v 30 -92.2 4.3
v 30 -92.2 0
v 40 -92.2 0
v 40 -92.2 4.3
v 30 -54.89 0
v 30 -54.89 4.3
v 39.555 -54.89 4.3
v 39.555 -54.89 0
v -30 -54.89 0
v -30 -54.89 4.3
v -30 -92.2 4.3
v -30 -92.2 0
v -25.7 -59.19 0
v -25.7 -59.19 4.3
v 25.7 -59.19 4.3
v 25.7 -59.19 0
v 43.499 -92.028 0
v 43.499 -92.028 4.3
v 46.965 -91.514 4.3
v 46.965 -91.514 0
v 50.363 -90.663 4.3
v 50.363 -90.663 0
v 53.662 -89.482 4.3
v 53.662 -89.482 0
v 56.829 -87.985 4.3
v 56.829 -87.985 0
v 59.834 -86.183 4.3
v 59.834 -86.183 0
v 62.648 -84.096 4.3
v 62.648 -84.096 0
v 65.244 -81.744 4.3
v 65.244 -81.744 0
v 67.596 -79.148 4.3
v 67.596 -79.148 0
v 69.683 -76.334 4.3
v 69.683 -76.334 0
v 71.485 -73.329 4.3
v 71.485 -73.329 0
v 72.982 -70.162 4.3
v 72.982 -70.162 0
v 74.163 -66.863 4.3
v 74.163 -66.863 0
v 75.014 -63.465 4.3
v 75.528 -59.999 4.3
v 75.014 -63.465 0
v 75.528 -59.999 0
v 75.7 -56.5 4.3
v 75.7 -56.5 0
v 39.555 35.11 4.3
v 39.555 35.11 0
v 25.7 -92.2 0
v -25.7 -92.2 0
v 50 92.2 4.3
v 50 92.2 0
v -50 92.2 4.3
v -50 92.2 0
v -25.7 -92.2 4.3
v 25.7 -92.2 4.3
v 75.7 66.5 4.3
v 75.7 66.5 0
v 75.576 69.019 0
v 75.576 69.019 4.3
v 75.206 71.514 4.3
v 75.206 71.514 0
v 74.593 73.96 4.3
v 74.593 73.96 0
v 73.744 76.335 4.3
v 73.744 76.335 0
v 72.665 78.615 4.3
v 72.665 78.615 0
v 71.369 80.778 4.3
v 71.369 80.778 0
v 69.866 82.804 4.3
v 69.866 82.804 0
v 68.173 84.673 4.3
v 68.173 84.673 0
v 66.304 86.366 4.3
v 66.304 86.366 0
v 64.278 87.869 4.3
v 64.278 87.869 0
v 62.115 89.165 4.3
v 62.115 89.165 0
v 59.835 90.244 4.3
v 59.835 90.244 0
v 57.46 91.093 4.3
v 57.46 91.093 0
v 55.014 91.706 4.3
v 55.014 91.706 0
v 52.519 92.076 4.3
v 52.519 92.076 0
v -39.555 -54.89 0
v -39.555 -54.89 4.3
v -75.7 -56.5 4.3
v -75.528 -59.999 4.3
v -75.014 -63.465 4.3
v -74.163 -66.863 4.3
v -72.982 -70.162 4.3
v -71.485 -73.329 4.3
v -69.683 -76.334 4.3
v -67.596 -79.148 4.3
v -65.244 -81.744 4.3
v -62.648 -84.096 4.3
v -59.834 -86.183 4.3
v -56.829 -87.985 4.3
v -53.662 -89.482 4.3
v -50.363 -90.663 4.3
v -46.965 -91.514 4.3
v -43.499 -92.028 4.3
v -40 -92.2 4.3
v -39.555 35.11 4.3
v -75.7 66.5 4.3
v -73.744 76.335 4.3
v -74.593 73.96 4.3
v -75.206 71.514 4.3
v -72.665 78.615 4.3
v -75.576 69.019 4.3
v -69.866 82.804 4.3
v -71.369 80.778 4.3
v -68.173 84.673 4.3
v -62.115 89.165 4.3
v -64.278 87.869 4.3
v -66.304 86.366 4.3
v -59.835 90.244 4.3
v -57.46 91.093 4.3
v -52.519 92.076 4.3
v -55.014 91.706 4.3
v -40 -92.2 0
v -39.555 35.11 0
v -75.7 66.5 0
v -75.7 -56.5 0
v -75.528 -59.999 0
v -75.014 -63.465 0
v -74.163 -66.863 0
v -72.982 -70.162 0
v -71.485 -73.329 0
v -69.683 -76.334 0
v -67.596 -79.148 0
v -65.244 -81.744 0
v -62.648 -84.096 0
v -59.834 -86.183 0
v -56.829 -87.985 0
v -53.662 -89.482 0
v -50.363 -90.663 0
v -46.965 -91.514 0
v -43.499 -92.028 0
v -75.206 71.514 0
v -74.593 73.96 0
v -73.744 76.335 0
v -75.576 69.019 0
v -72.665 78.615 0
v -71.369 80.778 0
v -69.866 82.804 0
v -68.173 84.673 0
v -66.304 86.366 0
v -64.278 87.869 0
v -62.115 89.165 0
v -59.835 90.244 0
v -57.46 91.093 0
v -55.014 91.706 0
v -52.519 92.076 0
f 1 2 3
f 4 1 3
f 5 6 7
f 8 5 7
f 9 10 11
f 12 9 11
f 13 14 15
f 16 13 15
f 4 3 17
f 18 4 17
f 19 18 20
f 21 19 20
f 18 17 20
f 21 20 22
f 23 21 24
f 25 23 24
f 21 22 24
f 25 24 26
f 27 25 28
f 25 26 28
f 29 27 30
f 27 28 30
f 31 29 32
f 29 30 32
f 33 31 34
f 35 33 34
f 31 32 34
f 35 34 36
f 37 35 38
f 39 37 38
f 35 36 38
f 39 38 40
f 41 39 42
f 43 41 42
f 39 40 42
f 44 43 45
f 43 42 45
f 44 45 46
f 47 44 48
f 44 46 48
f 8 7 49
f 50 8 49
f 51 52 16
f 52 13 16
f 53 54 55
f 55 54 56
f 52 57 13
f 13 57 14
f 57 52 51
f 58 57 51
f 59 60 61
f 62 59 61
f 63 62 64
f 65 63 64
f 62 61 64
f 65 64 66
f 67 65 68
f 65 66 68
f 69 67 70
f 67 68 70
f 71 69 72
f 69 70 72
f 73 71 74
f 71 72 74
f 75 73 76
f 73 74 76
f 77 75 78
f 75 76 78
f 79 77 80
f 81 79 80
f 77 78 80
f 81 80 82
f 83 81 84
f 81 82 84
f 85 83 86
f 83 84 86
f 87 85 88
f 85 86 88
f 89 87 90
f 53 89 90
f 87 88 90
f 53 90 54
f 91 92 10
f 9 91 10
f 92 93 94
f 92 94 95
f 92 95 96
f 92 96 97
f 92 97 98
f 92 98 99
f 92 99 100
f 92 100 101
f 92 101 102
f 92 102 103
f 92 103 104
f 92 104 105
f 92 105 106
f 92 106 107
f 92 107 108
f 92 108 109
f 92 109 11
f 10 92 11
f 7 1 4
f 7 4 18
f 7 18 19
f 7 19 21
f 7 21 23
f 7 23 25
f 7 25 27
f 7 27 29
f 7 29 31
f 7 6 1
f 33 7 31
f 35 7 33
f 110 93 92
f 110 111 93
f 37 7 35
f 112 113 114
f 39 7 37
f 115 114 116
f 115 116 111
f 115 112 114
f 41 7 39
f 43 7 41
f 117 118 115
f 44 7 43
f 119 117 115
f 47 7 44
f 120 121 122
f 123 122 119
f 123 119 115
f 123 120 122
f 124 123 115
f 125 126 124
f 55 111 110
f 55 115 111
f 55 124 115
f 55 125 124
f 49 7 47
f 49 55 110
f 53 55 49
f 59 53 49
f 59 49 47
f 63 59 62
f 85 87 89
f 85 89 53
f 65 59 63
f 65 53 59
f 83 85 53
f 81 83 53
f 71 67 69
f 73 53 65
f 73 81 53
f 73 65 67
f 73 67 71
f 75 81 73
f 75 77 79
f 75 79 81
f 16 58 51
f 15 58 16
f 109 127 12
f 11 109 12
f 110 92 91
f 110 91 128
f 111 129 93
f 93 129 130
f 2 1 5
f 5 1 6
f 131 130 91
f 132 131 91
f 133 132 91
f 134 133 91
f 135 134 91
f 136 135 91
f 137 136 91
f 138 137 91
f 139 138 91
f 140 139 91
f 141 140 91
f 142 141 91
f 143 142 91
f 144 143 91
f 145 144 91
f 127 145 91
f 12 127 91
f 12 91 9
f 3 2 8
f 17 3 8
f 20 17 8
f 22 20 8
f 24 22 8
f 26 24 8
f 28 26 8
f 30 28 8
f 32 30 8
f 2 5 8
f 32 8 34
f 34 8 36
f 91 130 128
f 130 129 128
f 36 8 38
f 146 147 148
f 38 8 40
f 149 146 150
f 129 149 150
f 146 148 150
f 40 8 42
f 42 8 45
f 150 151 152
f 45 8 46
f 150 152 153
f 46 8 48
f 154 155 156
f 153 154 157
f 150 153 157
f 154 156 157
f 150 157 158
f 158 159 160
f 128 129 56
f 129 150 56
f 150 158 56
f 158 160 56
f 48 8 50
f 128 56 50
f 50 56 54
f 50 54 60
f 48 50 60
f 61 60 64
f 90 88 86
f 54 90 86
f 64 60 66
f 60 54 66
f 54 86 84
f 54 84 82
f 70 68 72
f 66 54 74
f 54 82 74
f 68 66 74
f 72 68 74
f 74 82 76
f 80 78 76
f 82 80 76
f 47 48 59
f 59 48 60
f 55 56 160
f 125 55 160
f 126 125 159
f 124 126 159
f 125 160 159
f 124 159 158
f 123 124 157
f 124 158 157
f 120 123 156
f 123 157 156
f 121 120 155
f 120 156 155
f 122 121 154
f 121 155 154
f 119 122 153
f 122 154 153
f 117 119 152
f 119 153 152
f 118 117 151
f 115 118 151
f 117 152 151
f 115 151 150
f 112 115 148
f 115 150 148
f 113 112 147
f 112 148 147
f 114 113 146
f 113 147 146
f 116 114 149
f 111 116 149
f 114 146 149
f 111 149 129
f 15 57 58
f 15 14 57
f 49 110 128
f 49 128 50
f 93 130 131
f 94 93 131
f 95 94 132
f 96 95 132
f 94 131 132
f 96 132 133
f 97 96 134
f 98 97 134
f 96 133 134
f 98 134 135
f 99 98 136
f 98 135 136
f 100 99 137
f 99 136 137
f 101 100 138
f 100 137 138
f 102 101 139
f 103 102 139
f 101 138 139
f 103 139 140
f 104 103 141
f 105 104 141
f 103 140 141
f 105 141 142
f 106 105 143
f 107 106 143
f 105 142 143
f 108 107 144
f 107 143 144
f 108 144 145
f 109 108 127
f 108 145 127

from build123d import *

# Parameters (mm, degrees)
BOSS_EXTRUDE1_DEPTH = 4.3
SKETCH2_W           = 79.11
SKETCH2_H           = 90
SKETCH2_W_2         = 4.3
SKETCH2_H_2         = 33.01
CUT_EXTRUDE1_DEPTH  = 10


with BuildPart() as part:
    # Sketch1 → Boss-Extrude1 (new body)
    with BuildSketch(Plane.XY):
        with BuildLine():
            Line((0.5, -92.2), (40, -92.2))
            ThreePointArc((40, -92.2), (65.243712088, -81.743712088), (75.7, -56.5))
            Line((75.7, -56.5), (75.7, 66.5))
            ThreePointArc((75.7, 66.5), (68.172644276, 84.672644276), (50, 92.2))
            Line((50, 92.2), (-50, 92.2))
            ThreePointArc((-50, 92.2), (-68.172644276, 84.672644276), (-75.7, 66.5))
            Line((-75.7, 66.5), (-75.7, -56.5))
            ThreePointArc((-75.7, -56.5), (-65.243712088, -81.743712088), (-40, -92.2))
            Line((-40, -92.2), (-0.5, -92.2))
            Line((-0.5, -92.2), (0.5, -92.2))
        make_face()
    extrude(amount=BOSS_EXTRUDE1_DEPTH)

    # Sketch2 → Cut-Extrude1 (cut)
    with BuildSketch(Plane.XY.offset(4.3)):
        with Locations((0, -9.89)):
            Rectangle(SKETCH2_W, SKETCH2_H)
        Polygon((30, -54.89), (-30, -54.89), (-30, -59.19), (-25.7, -59.19), (25.7, -59.19), (30, -59.19), align=None)
        with Locations((-27.85, -75.695)):
            Rectangle(SKETCH2_W_2, SKETCH2_H_2)
        with Locations((27.85, -75.695)):
            Rectangle(SKETCH2_W_2, SKETCH2_H_2)
    extrude(amount=-CUT_EXTRUDE1_DEPTH, mode=Mode.SUBTRACT)


solid = part.part
